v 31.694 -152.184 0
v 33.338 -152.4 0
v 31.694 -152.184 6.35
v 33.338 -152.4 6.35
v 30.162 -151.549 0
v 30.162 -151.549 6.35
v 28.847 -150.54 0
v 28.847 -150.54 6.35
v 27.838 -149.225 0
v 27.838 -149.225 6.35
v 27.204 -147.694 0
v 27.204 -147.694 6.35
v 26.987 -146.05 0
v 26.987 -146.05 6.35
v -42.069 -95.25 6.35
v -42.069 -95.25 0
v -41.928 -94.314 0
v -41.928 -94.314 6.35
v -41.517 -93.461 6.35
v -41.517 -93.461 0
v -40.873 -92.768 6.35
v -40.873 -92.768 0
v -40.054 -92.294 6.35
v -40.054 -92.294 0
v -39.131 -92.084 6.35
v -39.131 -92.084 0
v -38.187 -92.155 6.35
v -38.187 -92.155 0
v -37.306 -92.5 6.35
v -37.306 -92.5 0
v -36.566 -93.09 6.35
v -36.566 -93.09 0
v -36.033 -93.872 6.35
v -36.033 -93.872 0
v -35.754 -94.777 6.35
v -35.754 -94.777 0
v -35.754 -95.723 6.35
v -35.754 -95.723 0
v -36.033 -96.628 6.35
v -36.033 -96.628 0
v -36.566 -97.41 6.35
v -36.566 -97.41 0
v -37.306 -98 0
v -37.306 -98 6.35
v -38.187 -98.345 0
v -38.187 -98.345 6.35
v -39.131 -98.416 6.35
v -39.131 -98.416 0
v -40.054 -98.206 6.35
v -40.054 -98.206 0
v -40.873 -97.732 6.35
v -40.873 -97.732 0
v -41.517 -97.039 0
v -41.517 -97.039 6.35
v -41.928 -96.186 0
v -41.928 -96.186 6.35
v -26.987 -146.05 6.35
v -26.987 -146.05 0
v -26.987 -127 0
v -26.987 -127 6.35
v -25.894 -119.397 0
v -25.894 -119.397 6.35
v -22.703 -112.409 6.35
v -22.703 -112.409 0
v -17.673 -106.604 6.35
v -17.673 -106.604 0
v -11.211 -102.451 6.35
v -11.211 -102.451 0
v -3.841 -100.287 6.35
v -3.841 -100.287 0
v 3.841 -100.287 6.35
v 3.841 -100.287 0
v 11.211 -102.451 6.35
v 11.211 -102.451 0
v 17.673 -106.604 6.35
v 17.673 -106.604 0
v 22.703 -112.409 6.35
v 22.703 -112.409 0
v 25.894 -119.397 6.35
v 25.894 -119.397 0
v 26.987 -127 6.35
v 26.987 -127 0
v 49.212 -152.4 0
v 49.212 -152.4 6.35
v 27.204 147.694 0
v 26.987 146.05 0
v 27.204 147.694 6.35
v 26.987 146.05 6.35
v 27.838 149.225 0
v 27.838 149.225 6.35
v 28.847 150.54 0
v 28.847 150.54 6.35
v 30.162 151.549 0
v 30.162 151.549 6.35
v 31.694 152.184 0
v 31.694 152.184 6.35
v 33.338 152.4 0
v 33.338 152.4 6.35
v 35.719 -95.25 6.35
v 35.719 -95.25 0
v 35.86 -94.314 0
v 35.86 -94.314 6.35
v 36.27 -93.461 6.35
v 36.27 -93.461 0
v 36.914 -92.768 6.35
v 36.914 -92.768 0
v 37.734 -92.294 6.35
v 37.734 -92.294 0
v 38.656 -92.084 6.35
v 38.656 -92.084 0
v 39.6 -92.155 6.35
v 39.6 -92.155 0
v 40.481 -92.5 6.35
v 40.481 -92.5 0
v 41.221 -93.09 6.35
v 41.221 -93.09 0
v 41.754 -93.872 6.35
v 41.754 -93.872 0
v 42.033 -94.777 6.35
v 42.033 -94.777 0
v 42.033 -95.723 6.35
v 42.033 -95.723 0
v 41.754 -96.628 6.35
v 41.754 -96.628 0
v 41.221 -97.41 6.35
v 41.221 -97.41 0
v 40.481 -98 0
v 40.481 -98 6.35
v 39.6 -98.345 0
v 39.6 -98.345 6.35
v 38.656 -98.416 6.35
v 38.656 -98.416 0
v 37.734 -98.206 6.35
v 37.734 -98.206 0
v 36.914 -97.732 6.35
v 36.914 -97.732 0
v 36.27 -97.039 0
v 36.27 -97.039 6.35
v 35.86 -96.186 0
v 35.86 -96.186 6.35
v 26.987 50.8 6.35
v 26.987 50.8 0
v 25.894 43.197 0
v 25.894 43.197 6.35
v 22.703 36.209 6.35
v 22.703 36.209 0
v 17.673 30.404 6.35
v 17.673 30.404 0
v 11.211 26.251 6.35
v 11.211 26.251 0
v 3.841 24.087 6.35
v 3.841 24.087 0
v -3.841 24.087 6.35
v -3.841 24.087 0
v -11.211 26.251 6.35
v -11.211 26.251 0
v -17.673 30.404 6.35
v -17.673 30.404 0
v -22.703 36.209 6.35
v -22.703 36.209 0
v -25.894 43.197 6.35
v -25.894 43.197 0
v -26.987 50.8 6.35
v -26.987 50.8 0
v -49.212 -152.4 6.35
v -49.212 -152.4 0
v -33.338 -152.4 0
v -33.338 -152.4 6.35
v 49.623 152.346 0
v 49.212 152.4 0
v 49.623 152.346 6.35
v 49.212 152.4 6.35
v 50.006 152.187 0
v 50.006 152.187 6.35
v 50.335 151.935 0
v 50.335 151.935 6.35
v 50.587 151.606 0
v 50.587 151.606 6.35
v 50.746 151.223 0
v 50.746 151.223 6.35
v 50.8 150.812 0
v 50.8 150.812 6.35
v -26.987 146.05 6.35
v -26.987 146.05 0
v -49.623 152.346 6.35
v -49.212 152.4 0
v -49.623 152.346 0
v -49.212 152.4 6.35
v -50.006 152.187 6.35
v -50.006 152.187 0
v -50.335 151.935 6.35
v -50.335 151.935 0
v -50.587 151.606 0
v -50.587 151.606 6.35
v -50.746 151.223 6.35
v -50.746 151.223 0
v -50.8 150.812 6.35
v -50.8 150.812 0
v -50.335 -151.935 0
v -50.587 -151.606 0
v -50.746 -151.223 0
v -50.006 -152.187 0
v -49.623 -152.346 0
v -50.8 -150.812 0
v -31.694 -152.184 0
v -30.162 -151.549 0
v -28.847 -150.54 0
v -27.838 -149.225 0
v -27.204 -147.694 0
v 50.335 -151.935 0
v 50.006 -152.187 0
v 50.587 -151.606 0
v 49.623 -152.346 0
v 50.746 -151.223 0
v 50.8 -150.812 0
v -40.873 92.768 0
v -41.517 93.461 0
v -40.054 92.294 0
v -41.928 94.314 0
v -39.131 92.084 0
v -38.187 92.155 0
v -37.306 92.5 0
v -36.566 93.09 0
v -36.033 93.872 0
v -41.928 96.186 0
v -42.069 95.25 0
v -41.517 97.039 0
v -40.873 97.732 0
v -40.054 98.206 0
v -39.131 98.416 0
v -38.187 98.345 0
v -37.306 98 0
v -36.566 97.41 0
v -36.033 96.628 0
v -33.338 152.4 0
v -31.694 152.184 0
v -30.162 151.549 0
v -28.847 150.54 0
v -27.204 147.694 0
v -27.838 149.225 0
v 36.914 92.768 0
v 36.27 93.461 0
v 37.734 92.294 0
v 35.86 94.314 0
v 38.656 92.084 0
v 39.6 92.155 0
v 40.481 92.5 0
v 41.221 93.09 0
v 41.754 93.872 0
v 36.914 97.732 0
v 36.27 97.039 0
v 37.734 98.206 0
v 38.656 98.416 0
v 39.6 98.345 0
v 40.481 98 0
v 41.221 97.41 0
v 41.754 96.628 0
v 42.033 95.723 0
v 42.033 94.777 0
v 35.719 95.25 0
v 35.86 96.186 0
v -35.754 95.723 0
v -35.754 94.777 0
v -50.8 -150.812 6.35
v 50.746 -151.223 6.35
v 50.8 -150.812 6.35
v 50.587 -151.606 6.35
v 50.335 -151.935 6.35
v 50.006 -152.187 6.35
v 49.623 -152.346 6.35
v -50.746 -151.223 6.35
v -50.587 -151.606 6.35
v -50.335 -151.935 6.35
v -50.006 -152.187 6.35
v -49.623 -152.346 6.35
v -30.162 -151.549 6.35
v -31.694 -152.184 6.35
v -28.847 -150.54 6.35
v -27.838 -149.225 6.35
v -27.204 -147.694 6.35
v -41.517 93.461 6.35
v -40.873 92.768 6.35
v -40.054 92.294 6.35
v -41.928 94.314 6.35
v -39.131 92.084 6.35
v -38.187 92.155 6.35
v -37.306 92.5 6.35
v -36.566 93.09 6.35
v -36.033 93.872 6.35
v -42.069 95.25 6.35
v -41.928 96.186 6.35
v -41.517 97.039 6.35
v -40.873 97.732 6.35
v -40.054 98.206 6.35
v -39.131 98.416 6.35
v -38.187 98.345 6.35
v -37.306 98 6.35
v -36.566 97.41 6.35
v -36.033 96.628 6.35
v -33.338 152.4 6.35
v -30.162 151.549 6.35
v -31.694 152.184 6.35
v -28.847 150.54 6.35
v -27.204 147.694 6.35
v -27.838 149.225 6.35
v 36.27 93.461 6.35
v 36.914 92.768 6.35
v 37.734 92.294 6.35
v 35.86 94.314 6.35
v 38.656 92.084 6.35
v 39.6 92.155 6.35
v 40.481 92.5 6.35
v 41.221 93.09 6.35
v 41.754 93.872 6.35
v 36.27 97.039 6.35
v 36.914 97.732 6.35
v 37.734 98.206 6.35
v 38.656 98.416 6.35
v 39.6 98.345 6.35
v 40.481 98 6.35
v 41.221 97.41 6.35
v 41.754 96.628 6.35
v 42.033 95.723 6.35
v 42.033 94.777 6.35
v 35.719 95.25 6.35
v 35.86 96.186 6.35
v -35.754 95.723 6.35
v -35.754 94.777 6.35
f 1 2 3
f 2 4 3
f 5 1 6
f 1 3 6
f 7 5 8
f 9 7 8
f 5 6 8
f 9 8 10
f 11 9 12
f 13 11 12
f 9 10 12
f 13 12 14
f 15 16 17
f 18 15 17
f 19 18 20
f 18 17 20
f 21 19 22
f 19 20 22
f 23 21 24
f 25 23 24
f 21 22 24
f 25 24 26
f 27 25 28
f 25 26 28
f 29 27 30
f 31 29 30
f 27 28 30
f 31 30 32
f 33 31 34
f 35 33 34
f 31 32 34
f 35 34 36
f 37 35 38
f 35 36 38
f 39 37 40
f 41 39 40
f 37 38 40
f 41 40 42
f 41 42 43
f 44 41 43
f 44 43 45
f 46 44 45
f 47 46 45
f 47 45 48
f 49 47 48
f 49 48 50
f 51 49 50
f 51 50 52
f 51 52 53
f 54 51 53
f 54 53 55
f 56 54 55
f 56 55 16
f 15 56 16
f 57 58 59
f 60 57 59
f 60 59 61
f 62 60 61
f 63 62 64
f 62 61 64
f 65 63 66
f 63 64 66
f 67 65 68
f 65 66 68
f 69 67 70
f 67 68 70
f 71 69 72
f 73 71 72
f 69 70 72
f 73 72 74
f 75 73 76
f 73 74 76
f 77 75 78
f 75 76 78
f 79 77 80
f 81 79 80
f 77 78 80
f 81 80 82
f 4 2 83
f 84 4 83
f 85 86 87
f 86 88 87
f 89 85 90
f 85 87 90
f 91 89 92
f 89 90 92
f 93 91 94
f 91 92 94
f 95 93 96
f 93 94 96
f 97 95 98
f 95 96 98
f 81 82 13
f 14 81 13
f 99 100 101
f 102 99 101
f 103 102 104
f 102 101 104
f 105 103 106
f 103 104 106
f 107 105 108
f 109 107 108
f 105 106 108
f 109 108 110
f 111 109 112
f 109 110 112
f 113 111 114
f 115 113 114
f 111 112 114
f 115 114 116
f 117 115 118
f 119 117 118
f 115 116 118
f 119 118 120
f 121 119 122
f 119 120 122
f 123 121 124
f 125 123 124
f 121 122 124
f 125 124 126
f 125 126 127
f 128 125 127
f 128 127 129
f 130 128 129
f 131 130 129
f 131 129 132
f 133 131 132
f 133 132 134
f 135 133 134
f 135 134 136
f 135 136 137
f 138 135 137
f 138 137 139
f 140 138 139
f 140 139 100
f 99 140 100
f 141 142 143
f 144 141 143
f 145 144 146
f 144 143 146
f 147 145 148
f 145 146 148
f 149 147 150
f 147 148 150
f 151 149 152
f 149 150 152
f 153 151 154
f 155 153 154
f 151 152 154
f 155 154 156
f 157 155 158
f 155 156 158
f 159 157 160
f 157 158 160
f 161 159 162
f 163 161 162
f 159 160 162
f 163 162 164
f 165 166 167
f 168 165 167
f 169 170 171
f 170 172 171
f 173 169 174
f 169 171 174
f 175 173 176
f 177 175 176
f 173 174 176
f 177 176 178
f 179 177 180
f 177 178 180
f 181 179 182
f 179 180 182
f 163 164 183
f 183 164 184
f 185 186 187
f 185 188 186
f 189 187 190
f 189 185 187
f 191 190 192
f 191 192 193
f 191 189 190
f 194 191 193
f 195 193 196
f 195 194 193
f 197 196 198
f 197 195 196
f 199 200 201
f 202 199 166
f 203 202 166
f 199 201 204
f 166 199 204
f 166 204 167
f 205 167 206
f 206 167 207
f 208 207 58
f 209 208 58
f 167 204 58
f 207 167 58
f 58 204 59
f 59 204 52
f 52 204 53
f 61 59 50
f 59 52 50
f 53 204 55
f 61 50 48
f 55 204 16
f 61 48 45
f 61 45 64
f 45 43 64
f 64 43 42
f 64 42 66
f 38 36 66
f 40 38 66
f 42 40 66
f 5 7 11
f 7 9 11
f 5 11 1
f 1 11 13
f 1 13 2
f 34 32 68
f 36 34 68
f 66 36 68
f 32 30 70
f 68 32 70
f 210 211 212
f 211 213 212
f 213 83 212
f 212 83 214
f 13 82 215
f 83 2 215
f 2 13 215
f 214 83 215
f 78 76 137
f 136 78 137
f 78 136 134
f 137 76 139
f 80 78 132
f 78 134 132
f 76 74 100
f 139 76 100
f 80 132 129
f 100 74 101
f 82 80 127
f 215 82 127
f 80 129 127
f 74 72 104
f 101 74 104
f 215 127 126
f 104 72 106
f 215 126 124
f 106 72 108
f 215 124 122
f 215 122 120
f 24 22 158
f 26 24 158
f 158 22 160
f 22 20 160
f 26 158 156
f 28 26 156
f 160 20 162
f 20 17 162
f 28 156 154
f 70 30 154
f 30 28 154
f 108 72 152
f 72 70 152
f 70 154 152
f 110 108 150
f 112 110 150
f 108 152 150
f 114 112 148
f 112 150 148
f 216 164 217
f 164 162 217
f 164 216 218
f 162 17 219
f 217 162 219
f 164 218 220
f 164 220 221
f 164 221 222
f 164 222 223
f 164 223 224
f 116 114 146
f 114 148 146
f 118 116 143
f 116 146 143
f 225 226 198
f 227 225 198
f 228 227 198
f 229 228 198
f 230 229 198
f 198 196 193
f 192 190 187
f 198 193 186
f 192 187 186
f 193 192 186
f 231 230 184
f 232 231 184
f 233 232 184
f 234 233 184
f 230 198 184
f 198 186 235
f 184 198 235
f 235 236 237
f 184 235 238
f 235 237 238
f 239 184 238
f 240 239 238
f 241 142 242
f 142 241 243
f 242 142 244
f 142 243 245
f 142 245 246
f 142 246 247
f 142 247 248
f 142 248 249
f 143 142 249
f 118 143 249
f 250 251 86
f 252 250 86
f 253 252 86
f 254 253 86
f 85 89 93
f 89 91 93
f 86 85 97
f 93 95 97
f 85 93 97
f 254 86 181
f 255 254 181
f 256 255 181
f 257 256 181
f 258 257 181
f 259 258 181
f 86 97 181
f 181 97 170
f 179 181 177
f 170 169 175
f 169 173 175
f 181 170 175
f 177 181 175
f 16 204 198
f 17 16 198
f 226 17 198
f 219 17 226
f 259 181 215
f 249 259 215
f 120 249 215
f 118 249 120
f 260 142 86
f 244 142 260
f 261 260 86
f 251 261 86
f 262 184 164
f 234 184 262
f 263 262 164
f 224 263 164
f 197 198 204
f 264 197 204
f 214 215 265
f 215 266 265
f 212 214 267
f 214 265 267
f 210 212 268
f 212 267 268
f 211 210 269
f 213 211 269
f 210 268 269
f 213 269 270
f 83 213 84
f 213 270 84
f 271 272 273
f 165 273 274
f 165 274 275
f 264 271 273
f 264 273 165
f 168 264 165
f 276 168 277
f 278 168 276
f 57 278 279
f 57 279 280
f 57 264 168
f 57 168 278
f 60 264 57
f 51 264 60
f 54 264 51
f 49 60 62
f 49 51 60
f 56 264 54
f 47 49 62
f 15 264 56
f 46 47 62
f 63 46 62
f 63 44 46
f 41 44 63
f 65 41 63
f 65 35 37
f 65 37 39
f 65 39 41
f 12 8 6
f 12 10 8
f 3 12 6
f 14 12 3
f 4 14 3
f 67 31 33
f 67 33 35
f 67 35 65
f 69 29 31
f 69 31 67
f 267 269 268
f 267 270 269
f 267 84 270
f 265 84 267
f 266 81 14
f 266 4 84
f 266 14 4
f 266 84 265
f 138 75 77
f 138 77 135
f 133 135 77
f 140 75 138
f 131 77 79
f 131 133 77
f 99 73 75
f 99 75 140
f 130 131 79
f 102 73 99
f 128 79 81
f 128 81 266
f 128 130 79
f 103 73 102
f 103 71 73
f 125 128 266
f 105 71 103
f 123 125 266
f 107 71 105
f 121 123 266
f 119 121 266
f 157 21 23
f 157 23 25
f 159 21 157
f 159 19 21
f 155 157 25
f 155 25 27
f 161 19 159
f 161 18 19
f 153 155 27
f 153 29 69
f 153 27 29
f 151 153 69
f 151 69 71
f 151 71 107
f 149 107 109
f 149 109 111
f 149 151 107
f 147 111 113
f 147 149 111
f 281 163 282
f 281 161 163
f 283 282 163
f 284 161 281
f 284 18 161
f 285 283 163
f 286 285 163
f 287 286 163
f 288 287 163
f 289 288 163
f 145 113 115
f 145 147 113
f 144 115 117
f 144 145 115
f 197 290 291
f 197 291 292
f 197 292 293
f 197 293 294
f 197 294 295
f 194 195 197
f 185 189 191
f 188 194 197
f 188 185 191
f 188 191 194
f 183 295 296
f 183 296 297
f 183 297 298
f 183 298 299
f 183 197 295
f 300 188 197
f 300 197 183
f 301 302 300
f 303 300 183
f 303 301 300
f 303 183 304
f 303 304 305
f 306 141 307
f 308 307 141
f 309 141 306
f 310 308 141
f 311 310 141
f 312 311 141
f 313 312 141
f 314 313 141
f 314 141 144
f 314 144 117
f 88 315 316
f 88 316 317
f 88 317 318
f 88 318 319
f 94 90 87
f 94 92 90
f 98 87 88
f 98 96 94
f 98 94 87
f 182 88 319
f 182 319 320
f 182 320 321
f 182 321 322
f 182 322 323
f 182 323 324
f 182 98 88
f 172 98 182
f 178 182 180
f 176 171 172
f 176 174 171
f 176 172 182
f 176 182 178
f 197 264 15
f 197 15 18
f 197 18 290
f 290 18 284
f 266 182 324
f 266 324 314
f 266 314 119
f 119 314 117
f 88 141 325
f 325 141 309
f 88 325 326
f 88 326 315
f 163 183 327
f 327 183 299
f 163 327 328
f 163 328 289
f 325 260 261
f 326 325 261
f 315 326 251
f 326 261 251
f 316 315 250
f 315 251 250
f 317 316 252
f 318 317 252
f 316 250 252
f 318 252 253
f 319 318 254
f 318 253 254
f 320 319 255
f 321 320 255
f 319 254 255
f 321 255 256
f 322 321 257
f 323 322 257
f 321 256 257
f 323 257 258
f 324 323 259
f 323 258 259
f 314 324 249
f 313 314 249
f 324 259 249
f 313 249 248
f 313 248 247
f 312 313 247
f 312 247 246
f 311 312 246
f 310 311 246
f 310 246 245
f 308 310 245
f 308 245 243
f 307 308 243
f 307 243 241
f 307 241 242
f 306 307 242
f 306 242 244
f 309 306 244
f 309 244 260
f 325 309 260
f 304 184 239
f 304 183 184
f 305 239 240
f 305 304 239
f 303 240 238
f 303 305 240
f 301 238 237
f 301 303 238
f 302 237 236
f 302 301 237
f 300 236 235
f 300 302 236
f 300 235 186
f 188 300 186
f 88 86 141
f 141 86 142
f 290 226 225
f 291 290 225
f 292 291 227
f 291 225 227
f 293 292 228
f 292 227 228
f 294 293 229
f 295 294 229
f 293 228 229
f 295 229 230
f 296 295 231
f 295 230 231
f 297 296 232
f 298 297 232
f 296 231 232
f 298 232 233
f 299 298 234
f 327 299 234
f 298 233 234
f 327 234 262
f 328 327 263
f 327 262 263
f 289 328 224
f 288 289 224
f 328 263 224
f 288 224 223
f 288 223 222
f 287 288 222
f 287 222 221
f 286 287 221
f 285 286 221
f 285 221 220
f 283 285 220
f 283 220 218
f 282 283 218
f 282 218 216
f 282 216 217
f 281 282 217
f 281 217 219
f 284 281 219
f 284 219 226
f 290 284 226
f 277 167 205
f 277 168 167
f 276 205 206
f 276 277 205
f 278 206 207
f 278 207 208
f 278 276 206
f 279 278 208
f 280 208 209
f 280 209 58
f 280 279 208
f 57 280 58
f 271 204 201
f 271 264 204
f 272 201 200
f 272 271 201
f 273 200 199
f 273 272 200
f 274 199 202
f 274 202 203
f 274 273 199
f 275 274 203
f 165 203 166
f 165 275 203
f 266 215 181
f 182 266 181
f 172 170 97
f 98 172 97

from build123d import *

# Parameters (mm, degrees)
BOSS_EXTRUDE1_DEPTH            = 6.35
F_1_4_0_2500_DOWEL_HOLE1_D     = 6.35
F_1_4_0_2500_DOWEL_HOLE1_DEPTH = 6.35
FILLET1_R                      = 6.35
FILLET2_R                      = 1.5875


with BuildPart() as part:
    # Sketch1 → Boss-Extrude1 (new body)
    with BuildSketch(Plane.XY):
        with BuildLine():
            Line((-26.9875, 50.8), (-26.9875, 152.4))
            Line((-26.9875, 152.4), (-50.8, 152.4))
            Line((-50.8, 152.4), (-50.8, -152.4))
            Line((-50.8, -152.4), (-26.9875, -152.4))
            Line((-26.9875, -152.4), (-26.9875, -127))
            ThreePointArc((-26.9875, -127), (0, -100.0125), (26.9875, -127))
            Line((26.9875, -127), (26.9875, -152.4))
            Line((26.9875, -152.4), (50.8, -152.4))
            Line((50.8, -152.4), (50.8, 152.4))
            Line((50.8, 152.4), (26.9875, 152.4))
            Line((26.9875, 152.4), (26.9875, 50.8))
            ThreePointArc((26.9875, 50.8), (0, 23.8125), (-26.9875, 50.8))
        make_face()
    extrude(amount=BOSS_EXTRUDE1_DEPTH)

    # 1/4 (0.2500) Dowel Hole1
    with Locations(Plane.XY.offset(6.35)):
        with Locations((-38.89375, 95.25), (38.89375, 95.25), (38.89375, -95.25), (-38.89375, -95.25)):
            Hole(F_1_4_0_2500_DOWEL_HOLE1_D / 2, depth=F_1_4_0_2500_DOWEL_HOLE1_DEPTH)

    # Fillet1
    fillet1_edges = [part.edges().sort_by_distance(p)[0] for p in [
        (26.9875, -152.4, 3.175),
        (-26.9875, -152.4, 3.175),
        (-26.9875, 152.4, 3.175),
        (26.9875, 152.4, 3.175),
    ]]
    fillet(fillet1_edges, radius=FILLET1_R)

    # Fillet2
    fillet2_edges = [part.edges().sort_by_distance(p)[0] for p in [
        (-50.8, -152.4, 3.175),
        (-50.8, 152.4, 3.175),
        (50.8, 152.4, 3.175),
        (50.8, -152.4, 3.175),
    ]]
    fillet(fillet2_edges, radius=FILLET2_R)


solid = part.part
